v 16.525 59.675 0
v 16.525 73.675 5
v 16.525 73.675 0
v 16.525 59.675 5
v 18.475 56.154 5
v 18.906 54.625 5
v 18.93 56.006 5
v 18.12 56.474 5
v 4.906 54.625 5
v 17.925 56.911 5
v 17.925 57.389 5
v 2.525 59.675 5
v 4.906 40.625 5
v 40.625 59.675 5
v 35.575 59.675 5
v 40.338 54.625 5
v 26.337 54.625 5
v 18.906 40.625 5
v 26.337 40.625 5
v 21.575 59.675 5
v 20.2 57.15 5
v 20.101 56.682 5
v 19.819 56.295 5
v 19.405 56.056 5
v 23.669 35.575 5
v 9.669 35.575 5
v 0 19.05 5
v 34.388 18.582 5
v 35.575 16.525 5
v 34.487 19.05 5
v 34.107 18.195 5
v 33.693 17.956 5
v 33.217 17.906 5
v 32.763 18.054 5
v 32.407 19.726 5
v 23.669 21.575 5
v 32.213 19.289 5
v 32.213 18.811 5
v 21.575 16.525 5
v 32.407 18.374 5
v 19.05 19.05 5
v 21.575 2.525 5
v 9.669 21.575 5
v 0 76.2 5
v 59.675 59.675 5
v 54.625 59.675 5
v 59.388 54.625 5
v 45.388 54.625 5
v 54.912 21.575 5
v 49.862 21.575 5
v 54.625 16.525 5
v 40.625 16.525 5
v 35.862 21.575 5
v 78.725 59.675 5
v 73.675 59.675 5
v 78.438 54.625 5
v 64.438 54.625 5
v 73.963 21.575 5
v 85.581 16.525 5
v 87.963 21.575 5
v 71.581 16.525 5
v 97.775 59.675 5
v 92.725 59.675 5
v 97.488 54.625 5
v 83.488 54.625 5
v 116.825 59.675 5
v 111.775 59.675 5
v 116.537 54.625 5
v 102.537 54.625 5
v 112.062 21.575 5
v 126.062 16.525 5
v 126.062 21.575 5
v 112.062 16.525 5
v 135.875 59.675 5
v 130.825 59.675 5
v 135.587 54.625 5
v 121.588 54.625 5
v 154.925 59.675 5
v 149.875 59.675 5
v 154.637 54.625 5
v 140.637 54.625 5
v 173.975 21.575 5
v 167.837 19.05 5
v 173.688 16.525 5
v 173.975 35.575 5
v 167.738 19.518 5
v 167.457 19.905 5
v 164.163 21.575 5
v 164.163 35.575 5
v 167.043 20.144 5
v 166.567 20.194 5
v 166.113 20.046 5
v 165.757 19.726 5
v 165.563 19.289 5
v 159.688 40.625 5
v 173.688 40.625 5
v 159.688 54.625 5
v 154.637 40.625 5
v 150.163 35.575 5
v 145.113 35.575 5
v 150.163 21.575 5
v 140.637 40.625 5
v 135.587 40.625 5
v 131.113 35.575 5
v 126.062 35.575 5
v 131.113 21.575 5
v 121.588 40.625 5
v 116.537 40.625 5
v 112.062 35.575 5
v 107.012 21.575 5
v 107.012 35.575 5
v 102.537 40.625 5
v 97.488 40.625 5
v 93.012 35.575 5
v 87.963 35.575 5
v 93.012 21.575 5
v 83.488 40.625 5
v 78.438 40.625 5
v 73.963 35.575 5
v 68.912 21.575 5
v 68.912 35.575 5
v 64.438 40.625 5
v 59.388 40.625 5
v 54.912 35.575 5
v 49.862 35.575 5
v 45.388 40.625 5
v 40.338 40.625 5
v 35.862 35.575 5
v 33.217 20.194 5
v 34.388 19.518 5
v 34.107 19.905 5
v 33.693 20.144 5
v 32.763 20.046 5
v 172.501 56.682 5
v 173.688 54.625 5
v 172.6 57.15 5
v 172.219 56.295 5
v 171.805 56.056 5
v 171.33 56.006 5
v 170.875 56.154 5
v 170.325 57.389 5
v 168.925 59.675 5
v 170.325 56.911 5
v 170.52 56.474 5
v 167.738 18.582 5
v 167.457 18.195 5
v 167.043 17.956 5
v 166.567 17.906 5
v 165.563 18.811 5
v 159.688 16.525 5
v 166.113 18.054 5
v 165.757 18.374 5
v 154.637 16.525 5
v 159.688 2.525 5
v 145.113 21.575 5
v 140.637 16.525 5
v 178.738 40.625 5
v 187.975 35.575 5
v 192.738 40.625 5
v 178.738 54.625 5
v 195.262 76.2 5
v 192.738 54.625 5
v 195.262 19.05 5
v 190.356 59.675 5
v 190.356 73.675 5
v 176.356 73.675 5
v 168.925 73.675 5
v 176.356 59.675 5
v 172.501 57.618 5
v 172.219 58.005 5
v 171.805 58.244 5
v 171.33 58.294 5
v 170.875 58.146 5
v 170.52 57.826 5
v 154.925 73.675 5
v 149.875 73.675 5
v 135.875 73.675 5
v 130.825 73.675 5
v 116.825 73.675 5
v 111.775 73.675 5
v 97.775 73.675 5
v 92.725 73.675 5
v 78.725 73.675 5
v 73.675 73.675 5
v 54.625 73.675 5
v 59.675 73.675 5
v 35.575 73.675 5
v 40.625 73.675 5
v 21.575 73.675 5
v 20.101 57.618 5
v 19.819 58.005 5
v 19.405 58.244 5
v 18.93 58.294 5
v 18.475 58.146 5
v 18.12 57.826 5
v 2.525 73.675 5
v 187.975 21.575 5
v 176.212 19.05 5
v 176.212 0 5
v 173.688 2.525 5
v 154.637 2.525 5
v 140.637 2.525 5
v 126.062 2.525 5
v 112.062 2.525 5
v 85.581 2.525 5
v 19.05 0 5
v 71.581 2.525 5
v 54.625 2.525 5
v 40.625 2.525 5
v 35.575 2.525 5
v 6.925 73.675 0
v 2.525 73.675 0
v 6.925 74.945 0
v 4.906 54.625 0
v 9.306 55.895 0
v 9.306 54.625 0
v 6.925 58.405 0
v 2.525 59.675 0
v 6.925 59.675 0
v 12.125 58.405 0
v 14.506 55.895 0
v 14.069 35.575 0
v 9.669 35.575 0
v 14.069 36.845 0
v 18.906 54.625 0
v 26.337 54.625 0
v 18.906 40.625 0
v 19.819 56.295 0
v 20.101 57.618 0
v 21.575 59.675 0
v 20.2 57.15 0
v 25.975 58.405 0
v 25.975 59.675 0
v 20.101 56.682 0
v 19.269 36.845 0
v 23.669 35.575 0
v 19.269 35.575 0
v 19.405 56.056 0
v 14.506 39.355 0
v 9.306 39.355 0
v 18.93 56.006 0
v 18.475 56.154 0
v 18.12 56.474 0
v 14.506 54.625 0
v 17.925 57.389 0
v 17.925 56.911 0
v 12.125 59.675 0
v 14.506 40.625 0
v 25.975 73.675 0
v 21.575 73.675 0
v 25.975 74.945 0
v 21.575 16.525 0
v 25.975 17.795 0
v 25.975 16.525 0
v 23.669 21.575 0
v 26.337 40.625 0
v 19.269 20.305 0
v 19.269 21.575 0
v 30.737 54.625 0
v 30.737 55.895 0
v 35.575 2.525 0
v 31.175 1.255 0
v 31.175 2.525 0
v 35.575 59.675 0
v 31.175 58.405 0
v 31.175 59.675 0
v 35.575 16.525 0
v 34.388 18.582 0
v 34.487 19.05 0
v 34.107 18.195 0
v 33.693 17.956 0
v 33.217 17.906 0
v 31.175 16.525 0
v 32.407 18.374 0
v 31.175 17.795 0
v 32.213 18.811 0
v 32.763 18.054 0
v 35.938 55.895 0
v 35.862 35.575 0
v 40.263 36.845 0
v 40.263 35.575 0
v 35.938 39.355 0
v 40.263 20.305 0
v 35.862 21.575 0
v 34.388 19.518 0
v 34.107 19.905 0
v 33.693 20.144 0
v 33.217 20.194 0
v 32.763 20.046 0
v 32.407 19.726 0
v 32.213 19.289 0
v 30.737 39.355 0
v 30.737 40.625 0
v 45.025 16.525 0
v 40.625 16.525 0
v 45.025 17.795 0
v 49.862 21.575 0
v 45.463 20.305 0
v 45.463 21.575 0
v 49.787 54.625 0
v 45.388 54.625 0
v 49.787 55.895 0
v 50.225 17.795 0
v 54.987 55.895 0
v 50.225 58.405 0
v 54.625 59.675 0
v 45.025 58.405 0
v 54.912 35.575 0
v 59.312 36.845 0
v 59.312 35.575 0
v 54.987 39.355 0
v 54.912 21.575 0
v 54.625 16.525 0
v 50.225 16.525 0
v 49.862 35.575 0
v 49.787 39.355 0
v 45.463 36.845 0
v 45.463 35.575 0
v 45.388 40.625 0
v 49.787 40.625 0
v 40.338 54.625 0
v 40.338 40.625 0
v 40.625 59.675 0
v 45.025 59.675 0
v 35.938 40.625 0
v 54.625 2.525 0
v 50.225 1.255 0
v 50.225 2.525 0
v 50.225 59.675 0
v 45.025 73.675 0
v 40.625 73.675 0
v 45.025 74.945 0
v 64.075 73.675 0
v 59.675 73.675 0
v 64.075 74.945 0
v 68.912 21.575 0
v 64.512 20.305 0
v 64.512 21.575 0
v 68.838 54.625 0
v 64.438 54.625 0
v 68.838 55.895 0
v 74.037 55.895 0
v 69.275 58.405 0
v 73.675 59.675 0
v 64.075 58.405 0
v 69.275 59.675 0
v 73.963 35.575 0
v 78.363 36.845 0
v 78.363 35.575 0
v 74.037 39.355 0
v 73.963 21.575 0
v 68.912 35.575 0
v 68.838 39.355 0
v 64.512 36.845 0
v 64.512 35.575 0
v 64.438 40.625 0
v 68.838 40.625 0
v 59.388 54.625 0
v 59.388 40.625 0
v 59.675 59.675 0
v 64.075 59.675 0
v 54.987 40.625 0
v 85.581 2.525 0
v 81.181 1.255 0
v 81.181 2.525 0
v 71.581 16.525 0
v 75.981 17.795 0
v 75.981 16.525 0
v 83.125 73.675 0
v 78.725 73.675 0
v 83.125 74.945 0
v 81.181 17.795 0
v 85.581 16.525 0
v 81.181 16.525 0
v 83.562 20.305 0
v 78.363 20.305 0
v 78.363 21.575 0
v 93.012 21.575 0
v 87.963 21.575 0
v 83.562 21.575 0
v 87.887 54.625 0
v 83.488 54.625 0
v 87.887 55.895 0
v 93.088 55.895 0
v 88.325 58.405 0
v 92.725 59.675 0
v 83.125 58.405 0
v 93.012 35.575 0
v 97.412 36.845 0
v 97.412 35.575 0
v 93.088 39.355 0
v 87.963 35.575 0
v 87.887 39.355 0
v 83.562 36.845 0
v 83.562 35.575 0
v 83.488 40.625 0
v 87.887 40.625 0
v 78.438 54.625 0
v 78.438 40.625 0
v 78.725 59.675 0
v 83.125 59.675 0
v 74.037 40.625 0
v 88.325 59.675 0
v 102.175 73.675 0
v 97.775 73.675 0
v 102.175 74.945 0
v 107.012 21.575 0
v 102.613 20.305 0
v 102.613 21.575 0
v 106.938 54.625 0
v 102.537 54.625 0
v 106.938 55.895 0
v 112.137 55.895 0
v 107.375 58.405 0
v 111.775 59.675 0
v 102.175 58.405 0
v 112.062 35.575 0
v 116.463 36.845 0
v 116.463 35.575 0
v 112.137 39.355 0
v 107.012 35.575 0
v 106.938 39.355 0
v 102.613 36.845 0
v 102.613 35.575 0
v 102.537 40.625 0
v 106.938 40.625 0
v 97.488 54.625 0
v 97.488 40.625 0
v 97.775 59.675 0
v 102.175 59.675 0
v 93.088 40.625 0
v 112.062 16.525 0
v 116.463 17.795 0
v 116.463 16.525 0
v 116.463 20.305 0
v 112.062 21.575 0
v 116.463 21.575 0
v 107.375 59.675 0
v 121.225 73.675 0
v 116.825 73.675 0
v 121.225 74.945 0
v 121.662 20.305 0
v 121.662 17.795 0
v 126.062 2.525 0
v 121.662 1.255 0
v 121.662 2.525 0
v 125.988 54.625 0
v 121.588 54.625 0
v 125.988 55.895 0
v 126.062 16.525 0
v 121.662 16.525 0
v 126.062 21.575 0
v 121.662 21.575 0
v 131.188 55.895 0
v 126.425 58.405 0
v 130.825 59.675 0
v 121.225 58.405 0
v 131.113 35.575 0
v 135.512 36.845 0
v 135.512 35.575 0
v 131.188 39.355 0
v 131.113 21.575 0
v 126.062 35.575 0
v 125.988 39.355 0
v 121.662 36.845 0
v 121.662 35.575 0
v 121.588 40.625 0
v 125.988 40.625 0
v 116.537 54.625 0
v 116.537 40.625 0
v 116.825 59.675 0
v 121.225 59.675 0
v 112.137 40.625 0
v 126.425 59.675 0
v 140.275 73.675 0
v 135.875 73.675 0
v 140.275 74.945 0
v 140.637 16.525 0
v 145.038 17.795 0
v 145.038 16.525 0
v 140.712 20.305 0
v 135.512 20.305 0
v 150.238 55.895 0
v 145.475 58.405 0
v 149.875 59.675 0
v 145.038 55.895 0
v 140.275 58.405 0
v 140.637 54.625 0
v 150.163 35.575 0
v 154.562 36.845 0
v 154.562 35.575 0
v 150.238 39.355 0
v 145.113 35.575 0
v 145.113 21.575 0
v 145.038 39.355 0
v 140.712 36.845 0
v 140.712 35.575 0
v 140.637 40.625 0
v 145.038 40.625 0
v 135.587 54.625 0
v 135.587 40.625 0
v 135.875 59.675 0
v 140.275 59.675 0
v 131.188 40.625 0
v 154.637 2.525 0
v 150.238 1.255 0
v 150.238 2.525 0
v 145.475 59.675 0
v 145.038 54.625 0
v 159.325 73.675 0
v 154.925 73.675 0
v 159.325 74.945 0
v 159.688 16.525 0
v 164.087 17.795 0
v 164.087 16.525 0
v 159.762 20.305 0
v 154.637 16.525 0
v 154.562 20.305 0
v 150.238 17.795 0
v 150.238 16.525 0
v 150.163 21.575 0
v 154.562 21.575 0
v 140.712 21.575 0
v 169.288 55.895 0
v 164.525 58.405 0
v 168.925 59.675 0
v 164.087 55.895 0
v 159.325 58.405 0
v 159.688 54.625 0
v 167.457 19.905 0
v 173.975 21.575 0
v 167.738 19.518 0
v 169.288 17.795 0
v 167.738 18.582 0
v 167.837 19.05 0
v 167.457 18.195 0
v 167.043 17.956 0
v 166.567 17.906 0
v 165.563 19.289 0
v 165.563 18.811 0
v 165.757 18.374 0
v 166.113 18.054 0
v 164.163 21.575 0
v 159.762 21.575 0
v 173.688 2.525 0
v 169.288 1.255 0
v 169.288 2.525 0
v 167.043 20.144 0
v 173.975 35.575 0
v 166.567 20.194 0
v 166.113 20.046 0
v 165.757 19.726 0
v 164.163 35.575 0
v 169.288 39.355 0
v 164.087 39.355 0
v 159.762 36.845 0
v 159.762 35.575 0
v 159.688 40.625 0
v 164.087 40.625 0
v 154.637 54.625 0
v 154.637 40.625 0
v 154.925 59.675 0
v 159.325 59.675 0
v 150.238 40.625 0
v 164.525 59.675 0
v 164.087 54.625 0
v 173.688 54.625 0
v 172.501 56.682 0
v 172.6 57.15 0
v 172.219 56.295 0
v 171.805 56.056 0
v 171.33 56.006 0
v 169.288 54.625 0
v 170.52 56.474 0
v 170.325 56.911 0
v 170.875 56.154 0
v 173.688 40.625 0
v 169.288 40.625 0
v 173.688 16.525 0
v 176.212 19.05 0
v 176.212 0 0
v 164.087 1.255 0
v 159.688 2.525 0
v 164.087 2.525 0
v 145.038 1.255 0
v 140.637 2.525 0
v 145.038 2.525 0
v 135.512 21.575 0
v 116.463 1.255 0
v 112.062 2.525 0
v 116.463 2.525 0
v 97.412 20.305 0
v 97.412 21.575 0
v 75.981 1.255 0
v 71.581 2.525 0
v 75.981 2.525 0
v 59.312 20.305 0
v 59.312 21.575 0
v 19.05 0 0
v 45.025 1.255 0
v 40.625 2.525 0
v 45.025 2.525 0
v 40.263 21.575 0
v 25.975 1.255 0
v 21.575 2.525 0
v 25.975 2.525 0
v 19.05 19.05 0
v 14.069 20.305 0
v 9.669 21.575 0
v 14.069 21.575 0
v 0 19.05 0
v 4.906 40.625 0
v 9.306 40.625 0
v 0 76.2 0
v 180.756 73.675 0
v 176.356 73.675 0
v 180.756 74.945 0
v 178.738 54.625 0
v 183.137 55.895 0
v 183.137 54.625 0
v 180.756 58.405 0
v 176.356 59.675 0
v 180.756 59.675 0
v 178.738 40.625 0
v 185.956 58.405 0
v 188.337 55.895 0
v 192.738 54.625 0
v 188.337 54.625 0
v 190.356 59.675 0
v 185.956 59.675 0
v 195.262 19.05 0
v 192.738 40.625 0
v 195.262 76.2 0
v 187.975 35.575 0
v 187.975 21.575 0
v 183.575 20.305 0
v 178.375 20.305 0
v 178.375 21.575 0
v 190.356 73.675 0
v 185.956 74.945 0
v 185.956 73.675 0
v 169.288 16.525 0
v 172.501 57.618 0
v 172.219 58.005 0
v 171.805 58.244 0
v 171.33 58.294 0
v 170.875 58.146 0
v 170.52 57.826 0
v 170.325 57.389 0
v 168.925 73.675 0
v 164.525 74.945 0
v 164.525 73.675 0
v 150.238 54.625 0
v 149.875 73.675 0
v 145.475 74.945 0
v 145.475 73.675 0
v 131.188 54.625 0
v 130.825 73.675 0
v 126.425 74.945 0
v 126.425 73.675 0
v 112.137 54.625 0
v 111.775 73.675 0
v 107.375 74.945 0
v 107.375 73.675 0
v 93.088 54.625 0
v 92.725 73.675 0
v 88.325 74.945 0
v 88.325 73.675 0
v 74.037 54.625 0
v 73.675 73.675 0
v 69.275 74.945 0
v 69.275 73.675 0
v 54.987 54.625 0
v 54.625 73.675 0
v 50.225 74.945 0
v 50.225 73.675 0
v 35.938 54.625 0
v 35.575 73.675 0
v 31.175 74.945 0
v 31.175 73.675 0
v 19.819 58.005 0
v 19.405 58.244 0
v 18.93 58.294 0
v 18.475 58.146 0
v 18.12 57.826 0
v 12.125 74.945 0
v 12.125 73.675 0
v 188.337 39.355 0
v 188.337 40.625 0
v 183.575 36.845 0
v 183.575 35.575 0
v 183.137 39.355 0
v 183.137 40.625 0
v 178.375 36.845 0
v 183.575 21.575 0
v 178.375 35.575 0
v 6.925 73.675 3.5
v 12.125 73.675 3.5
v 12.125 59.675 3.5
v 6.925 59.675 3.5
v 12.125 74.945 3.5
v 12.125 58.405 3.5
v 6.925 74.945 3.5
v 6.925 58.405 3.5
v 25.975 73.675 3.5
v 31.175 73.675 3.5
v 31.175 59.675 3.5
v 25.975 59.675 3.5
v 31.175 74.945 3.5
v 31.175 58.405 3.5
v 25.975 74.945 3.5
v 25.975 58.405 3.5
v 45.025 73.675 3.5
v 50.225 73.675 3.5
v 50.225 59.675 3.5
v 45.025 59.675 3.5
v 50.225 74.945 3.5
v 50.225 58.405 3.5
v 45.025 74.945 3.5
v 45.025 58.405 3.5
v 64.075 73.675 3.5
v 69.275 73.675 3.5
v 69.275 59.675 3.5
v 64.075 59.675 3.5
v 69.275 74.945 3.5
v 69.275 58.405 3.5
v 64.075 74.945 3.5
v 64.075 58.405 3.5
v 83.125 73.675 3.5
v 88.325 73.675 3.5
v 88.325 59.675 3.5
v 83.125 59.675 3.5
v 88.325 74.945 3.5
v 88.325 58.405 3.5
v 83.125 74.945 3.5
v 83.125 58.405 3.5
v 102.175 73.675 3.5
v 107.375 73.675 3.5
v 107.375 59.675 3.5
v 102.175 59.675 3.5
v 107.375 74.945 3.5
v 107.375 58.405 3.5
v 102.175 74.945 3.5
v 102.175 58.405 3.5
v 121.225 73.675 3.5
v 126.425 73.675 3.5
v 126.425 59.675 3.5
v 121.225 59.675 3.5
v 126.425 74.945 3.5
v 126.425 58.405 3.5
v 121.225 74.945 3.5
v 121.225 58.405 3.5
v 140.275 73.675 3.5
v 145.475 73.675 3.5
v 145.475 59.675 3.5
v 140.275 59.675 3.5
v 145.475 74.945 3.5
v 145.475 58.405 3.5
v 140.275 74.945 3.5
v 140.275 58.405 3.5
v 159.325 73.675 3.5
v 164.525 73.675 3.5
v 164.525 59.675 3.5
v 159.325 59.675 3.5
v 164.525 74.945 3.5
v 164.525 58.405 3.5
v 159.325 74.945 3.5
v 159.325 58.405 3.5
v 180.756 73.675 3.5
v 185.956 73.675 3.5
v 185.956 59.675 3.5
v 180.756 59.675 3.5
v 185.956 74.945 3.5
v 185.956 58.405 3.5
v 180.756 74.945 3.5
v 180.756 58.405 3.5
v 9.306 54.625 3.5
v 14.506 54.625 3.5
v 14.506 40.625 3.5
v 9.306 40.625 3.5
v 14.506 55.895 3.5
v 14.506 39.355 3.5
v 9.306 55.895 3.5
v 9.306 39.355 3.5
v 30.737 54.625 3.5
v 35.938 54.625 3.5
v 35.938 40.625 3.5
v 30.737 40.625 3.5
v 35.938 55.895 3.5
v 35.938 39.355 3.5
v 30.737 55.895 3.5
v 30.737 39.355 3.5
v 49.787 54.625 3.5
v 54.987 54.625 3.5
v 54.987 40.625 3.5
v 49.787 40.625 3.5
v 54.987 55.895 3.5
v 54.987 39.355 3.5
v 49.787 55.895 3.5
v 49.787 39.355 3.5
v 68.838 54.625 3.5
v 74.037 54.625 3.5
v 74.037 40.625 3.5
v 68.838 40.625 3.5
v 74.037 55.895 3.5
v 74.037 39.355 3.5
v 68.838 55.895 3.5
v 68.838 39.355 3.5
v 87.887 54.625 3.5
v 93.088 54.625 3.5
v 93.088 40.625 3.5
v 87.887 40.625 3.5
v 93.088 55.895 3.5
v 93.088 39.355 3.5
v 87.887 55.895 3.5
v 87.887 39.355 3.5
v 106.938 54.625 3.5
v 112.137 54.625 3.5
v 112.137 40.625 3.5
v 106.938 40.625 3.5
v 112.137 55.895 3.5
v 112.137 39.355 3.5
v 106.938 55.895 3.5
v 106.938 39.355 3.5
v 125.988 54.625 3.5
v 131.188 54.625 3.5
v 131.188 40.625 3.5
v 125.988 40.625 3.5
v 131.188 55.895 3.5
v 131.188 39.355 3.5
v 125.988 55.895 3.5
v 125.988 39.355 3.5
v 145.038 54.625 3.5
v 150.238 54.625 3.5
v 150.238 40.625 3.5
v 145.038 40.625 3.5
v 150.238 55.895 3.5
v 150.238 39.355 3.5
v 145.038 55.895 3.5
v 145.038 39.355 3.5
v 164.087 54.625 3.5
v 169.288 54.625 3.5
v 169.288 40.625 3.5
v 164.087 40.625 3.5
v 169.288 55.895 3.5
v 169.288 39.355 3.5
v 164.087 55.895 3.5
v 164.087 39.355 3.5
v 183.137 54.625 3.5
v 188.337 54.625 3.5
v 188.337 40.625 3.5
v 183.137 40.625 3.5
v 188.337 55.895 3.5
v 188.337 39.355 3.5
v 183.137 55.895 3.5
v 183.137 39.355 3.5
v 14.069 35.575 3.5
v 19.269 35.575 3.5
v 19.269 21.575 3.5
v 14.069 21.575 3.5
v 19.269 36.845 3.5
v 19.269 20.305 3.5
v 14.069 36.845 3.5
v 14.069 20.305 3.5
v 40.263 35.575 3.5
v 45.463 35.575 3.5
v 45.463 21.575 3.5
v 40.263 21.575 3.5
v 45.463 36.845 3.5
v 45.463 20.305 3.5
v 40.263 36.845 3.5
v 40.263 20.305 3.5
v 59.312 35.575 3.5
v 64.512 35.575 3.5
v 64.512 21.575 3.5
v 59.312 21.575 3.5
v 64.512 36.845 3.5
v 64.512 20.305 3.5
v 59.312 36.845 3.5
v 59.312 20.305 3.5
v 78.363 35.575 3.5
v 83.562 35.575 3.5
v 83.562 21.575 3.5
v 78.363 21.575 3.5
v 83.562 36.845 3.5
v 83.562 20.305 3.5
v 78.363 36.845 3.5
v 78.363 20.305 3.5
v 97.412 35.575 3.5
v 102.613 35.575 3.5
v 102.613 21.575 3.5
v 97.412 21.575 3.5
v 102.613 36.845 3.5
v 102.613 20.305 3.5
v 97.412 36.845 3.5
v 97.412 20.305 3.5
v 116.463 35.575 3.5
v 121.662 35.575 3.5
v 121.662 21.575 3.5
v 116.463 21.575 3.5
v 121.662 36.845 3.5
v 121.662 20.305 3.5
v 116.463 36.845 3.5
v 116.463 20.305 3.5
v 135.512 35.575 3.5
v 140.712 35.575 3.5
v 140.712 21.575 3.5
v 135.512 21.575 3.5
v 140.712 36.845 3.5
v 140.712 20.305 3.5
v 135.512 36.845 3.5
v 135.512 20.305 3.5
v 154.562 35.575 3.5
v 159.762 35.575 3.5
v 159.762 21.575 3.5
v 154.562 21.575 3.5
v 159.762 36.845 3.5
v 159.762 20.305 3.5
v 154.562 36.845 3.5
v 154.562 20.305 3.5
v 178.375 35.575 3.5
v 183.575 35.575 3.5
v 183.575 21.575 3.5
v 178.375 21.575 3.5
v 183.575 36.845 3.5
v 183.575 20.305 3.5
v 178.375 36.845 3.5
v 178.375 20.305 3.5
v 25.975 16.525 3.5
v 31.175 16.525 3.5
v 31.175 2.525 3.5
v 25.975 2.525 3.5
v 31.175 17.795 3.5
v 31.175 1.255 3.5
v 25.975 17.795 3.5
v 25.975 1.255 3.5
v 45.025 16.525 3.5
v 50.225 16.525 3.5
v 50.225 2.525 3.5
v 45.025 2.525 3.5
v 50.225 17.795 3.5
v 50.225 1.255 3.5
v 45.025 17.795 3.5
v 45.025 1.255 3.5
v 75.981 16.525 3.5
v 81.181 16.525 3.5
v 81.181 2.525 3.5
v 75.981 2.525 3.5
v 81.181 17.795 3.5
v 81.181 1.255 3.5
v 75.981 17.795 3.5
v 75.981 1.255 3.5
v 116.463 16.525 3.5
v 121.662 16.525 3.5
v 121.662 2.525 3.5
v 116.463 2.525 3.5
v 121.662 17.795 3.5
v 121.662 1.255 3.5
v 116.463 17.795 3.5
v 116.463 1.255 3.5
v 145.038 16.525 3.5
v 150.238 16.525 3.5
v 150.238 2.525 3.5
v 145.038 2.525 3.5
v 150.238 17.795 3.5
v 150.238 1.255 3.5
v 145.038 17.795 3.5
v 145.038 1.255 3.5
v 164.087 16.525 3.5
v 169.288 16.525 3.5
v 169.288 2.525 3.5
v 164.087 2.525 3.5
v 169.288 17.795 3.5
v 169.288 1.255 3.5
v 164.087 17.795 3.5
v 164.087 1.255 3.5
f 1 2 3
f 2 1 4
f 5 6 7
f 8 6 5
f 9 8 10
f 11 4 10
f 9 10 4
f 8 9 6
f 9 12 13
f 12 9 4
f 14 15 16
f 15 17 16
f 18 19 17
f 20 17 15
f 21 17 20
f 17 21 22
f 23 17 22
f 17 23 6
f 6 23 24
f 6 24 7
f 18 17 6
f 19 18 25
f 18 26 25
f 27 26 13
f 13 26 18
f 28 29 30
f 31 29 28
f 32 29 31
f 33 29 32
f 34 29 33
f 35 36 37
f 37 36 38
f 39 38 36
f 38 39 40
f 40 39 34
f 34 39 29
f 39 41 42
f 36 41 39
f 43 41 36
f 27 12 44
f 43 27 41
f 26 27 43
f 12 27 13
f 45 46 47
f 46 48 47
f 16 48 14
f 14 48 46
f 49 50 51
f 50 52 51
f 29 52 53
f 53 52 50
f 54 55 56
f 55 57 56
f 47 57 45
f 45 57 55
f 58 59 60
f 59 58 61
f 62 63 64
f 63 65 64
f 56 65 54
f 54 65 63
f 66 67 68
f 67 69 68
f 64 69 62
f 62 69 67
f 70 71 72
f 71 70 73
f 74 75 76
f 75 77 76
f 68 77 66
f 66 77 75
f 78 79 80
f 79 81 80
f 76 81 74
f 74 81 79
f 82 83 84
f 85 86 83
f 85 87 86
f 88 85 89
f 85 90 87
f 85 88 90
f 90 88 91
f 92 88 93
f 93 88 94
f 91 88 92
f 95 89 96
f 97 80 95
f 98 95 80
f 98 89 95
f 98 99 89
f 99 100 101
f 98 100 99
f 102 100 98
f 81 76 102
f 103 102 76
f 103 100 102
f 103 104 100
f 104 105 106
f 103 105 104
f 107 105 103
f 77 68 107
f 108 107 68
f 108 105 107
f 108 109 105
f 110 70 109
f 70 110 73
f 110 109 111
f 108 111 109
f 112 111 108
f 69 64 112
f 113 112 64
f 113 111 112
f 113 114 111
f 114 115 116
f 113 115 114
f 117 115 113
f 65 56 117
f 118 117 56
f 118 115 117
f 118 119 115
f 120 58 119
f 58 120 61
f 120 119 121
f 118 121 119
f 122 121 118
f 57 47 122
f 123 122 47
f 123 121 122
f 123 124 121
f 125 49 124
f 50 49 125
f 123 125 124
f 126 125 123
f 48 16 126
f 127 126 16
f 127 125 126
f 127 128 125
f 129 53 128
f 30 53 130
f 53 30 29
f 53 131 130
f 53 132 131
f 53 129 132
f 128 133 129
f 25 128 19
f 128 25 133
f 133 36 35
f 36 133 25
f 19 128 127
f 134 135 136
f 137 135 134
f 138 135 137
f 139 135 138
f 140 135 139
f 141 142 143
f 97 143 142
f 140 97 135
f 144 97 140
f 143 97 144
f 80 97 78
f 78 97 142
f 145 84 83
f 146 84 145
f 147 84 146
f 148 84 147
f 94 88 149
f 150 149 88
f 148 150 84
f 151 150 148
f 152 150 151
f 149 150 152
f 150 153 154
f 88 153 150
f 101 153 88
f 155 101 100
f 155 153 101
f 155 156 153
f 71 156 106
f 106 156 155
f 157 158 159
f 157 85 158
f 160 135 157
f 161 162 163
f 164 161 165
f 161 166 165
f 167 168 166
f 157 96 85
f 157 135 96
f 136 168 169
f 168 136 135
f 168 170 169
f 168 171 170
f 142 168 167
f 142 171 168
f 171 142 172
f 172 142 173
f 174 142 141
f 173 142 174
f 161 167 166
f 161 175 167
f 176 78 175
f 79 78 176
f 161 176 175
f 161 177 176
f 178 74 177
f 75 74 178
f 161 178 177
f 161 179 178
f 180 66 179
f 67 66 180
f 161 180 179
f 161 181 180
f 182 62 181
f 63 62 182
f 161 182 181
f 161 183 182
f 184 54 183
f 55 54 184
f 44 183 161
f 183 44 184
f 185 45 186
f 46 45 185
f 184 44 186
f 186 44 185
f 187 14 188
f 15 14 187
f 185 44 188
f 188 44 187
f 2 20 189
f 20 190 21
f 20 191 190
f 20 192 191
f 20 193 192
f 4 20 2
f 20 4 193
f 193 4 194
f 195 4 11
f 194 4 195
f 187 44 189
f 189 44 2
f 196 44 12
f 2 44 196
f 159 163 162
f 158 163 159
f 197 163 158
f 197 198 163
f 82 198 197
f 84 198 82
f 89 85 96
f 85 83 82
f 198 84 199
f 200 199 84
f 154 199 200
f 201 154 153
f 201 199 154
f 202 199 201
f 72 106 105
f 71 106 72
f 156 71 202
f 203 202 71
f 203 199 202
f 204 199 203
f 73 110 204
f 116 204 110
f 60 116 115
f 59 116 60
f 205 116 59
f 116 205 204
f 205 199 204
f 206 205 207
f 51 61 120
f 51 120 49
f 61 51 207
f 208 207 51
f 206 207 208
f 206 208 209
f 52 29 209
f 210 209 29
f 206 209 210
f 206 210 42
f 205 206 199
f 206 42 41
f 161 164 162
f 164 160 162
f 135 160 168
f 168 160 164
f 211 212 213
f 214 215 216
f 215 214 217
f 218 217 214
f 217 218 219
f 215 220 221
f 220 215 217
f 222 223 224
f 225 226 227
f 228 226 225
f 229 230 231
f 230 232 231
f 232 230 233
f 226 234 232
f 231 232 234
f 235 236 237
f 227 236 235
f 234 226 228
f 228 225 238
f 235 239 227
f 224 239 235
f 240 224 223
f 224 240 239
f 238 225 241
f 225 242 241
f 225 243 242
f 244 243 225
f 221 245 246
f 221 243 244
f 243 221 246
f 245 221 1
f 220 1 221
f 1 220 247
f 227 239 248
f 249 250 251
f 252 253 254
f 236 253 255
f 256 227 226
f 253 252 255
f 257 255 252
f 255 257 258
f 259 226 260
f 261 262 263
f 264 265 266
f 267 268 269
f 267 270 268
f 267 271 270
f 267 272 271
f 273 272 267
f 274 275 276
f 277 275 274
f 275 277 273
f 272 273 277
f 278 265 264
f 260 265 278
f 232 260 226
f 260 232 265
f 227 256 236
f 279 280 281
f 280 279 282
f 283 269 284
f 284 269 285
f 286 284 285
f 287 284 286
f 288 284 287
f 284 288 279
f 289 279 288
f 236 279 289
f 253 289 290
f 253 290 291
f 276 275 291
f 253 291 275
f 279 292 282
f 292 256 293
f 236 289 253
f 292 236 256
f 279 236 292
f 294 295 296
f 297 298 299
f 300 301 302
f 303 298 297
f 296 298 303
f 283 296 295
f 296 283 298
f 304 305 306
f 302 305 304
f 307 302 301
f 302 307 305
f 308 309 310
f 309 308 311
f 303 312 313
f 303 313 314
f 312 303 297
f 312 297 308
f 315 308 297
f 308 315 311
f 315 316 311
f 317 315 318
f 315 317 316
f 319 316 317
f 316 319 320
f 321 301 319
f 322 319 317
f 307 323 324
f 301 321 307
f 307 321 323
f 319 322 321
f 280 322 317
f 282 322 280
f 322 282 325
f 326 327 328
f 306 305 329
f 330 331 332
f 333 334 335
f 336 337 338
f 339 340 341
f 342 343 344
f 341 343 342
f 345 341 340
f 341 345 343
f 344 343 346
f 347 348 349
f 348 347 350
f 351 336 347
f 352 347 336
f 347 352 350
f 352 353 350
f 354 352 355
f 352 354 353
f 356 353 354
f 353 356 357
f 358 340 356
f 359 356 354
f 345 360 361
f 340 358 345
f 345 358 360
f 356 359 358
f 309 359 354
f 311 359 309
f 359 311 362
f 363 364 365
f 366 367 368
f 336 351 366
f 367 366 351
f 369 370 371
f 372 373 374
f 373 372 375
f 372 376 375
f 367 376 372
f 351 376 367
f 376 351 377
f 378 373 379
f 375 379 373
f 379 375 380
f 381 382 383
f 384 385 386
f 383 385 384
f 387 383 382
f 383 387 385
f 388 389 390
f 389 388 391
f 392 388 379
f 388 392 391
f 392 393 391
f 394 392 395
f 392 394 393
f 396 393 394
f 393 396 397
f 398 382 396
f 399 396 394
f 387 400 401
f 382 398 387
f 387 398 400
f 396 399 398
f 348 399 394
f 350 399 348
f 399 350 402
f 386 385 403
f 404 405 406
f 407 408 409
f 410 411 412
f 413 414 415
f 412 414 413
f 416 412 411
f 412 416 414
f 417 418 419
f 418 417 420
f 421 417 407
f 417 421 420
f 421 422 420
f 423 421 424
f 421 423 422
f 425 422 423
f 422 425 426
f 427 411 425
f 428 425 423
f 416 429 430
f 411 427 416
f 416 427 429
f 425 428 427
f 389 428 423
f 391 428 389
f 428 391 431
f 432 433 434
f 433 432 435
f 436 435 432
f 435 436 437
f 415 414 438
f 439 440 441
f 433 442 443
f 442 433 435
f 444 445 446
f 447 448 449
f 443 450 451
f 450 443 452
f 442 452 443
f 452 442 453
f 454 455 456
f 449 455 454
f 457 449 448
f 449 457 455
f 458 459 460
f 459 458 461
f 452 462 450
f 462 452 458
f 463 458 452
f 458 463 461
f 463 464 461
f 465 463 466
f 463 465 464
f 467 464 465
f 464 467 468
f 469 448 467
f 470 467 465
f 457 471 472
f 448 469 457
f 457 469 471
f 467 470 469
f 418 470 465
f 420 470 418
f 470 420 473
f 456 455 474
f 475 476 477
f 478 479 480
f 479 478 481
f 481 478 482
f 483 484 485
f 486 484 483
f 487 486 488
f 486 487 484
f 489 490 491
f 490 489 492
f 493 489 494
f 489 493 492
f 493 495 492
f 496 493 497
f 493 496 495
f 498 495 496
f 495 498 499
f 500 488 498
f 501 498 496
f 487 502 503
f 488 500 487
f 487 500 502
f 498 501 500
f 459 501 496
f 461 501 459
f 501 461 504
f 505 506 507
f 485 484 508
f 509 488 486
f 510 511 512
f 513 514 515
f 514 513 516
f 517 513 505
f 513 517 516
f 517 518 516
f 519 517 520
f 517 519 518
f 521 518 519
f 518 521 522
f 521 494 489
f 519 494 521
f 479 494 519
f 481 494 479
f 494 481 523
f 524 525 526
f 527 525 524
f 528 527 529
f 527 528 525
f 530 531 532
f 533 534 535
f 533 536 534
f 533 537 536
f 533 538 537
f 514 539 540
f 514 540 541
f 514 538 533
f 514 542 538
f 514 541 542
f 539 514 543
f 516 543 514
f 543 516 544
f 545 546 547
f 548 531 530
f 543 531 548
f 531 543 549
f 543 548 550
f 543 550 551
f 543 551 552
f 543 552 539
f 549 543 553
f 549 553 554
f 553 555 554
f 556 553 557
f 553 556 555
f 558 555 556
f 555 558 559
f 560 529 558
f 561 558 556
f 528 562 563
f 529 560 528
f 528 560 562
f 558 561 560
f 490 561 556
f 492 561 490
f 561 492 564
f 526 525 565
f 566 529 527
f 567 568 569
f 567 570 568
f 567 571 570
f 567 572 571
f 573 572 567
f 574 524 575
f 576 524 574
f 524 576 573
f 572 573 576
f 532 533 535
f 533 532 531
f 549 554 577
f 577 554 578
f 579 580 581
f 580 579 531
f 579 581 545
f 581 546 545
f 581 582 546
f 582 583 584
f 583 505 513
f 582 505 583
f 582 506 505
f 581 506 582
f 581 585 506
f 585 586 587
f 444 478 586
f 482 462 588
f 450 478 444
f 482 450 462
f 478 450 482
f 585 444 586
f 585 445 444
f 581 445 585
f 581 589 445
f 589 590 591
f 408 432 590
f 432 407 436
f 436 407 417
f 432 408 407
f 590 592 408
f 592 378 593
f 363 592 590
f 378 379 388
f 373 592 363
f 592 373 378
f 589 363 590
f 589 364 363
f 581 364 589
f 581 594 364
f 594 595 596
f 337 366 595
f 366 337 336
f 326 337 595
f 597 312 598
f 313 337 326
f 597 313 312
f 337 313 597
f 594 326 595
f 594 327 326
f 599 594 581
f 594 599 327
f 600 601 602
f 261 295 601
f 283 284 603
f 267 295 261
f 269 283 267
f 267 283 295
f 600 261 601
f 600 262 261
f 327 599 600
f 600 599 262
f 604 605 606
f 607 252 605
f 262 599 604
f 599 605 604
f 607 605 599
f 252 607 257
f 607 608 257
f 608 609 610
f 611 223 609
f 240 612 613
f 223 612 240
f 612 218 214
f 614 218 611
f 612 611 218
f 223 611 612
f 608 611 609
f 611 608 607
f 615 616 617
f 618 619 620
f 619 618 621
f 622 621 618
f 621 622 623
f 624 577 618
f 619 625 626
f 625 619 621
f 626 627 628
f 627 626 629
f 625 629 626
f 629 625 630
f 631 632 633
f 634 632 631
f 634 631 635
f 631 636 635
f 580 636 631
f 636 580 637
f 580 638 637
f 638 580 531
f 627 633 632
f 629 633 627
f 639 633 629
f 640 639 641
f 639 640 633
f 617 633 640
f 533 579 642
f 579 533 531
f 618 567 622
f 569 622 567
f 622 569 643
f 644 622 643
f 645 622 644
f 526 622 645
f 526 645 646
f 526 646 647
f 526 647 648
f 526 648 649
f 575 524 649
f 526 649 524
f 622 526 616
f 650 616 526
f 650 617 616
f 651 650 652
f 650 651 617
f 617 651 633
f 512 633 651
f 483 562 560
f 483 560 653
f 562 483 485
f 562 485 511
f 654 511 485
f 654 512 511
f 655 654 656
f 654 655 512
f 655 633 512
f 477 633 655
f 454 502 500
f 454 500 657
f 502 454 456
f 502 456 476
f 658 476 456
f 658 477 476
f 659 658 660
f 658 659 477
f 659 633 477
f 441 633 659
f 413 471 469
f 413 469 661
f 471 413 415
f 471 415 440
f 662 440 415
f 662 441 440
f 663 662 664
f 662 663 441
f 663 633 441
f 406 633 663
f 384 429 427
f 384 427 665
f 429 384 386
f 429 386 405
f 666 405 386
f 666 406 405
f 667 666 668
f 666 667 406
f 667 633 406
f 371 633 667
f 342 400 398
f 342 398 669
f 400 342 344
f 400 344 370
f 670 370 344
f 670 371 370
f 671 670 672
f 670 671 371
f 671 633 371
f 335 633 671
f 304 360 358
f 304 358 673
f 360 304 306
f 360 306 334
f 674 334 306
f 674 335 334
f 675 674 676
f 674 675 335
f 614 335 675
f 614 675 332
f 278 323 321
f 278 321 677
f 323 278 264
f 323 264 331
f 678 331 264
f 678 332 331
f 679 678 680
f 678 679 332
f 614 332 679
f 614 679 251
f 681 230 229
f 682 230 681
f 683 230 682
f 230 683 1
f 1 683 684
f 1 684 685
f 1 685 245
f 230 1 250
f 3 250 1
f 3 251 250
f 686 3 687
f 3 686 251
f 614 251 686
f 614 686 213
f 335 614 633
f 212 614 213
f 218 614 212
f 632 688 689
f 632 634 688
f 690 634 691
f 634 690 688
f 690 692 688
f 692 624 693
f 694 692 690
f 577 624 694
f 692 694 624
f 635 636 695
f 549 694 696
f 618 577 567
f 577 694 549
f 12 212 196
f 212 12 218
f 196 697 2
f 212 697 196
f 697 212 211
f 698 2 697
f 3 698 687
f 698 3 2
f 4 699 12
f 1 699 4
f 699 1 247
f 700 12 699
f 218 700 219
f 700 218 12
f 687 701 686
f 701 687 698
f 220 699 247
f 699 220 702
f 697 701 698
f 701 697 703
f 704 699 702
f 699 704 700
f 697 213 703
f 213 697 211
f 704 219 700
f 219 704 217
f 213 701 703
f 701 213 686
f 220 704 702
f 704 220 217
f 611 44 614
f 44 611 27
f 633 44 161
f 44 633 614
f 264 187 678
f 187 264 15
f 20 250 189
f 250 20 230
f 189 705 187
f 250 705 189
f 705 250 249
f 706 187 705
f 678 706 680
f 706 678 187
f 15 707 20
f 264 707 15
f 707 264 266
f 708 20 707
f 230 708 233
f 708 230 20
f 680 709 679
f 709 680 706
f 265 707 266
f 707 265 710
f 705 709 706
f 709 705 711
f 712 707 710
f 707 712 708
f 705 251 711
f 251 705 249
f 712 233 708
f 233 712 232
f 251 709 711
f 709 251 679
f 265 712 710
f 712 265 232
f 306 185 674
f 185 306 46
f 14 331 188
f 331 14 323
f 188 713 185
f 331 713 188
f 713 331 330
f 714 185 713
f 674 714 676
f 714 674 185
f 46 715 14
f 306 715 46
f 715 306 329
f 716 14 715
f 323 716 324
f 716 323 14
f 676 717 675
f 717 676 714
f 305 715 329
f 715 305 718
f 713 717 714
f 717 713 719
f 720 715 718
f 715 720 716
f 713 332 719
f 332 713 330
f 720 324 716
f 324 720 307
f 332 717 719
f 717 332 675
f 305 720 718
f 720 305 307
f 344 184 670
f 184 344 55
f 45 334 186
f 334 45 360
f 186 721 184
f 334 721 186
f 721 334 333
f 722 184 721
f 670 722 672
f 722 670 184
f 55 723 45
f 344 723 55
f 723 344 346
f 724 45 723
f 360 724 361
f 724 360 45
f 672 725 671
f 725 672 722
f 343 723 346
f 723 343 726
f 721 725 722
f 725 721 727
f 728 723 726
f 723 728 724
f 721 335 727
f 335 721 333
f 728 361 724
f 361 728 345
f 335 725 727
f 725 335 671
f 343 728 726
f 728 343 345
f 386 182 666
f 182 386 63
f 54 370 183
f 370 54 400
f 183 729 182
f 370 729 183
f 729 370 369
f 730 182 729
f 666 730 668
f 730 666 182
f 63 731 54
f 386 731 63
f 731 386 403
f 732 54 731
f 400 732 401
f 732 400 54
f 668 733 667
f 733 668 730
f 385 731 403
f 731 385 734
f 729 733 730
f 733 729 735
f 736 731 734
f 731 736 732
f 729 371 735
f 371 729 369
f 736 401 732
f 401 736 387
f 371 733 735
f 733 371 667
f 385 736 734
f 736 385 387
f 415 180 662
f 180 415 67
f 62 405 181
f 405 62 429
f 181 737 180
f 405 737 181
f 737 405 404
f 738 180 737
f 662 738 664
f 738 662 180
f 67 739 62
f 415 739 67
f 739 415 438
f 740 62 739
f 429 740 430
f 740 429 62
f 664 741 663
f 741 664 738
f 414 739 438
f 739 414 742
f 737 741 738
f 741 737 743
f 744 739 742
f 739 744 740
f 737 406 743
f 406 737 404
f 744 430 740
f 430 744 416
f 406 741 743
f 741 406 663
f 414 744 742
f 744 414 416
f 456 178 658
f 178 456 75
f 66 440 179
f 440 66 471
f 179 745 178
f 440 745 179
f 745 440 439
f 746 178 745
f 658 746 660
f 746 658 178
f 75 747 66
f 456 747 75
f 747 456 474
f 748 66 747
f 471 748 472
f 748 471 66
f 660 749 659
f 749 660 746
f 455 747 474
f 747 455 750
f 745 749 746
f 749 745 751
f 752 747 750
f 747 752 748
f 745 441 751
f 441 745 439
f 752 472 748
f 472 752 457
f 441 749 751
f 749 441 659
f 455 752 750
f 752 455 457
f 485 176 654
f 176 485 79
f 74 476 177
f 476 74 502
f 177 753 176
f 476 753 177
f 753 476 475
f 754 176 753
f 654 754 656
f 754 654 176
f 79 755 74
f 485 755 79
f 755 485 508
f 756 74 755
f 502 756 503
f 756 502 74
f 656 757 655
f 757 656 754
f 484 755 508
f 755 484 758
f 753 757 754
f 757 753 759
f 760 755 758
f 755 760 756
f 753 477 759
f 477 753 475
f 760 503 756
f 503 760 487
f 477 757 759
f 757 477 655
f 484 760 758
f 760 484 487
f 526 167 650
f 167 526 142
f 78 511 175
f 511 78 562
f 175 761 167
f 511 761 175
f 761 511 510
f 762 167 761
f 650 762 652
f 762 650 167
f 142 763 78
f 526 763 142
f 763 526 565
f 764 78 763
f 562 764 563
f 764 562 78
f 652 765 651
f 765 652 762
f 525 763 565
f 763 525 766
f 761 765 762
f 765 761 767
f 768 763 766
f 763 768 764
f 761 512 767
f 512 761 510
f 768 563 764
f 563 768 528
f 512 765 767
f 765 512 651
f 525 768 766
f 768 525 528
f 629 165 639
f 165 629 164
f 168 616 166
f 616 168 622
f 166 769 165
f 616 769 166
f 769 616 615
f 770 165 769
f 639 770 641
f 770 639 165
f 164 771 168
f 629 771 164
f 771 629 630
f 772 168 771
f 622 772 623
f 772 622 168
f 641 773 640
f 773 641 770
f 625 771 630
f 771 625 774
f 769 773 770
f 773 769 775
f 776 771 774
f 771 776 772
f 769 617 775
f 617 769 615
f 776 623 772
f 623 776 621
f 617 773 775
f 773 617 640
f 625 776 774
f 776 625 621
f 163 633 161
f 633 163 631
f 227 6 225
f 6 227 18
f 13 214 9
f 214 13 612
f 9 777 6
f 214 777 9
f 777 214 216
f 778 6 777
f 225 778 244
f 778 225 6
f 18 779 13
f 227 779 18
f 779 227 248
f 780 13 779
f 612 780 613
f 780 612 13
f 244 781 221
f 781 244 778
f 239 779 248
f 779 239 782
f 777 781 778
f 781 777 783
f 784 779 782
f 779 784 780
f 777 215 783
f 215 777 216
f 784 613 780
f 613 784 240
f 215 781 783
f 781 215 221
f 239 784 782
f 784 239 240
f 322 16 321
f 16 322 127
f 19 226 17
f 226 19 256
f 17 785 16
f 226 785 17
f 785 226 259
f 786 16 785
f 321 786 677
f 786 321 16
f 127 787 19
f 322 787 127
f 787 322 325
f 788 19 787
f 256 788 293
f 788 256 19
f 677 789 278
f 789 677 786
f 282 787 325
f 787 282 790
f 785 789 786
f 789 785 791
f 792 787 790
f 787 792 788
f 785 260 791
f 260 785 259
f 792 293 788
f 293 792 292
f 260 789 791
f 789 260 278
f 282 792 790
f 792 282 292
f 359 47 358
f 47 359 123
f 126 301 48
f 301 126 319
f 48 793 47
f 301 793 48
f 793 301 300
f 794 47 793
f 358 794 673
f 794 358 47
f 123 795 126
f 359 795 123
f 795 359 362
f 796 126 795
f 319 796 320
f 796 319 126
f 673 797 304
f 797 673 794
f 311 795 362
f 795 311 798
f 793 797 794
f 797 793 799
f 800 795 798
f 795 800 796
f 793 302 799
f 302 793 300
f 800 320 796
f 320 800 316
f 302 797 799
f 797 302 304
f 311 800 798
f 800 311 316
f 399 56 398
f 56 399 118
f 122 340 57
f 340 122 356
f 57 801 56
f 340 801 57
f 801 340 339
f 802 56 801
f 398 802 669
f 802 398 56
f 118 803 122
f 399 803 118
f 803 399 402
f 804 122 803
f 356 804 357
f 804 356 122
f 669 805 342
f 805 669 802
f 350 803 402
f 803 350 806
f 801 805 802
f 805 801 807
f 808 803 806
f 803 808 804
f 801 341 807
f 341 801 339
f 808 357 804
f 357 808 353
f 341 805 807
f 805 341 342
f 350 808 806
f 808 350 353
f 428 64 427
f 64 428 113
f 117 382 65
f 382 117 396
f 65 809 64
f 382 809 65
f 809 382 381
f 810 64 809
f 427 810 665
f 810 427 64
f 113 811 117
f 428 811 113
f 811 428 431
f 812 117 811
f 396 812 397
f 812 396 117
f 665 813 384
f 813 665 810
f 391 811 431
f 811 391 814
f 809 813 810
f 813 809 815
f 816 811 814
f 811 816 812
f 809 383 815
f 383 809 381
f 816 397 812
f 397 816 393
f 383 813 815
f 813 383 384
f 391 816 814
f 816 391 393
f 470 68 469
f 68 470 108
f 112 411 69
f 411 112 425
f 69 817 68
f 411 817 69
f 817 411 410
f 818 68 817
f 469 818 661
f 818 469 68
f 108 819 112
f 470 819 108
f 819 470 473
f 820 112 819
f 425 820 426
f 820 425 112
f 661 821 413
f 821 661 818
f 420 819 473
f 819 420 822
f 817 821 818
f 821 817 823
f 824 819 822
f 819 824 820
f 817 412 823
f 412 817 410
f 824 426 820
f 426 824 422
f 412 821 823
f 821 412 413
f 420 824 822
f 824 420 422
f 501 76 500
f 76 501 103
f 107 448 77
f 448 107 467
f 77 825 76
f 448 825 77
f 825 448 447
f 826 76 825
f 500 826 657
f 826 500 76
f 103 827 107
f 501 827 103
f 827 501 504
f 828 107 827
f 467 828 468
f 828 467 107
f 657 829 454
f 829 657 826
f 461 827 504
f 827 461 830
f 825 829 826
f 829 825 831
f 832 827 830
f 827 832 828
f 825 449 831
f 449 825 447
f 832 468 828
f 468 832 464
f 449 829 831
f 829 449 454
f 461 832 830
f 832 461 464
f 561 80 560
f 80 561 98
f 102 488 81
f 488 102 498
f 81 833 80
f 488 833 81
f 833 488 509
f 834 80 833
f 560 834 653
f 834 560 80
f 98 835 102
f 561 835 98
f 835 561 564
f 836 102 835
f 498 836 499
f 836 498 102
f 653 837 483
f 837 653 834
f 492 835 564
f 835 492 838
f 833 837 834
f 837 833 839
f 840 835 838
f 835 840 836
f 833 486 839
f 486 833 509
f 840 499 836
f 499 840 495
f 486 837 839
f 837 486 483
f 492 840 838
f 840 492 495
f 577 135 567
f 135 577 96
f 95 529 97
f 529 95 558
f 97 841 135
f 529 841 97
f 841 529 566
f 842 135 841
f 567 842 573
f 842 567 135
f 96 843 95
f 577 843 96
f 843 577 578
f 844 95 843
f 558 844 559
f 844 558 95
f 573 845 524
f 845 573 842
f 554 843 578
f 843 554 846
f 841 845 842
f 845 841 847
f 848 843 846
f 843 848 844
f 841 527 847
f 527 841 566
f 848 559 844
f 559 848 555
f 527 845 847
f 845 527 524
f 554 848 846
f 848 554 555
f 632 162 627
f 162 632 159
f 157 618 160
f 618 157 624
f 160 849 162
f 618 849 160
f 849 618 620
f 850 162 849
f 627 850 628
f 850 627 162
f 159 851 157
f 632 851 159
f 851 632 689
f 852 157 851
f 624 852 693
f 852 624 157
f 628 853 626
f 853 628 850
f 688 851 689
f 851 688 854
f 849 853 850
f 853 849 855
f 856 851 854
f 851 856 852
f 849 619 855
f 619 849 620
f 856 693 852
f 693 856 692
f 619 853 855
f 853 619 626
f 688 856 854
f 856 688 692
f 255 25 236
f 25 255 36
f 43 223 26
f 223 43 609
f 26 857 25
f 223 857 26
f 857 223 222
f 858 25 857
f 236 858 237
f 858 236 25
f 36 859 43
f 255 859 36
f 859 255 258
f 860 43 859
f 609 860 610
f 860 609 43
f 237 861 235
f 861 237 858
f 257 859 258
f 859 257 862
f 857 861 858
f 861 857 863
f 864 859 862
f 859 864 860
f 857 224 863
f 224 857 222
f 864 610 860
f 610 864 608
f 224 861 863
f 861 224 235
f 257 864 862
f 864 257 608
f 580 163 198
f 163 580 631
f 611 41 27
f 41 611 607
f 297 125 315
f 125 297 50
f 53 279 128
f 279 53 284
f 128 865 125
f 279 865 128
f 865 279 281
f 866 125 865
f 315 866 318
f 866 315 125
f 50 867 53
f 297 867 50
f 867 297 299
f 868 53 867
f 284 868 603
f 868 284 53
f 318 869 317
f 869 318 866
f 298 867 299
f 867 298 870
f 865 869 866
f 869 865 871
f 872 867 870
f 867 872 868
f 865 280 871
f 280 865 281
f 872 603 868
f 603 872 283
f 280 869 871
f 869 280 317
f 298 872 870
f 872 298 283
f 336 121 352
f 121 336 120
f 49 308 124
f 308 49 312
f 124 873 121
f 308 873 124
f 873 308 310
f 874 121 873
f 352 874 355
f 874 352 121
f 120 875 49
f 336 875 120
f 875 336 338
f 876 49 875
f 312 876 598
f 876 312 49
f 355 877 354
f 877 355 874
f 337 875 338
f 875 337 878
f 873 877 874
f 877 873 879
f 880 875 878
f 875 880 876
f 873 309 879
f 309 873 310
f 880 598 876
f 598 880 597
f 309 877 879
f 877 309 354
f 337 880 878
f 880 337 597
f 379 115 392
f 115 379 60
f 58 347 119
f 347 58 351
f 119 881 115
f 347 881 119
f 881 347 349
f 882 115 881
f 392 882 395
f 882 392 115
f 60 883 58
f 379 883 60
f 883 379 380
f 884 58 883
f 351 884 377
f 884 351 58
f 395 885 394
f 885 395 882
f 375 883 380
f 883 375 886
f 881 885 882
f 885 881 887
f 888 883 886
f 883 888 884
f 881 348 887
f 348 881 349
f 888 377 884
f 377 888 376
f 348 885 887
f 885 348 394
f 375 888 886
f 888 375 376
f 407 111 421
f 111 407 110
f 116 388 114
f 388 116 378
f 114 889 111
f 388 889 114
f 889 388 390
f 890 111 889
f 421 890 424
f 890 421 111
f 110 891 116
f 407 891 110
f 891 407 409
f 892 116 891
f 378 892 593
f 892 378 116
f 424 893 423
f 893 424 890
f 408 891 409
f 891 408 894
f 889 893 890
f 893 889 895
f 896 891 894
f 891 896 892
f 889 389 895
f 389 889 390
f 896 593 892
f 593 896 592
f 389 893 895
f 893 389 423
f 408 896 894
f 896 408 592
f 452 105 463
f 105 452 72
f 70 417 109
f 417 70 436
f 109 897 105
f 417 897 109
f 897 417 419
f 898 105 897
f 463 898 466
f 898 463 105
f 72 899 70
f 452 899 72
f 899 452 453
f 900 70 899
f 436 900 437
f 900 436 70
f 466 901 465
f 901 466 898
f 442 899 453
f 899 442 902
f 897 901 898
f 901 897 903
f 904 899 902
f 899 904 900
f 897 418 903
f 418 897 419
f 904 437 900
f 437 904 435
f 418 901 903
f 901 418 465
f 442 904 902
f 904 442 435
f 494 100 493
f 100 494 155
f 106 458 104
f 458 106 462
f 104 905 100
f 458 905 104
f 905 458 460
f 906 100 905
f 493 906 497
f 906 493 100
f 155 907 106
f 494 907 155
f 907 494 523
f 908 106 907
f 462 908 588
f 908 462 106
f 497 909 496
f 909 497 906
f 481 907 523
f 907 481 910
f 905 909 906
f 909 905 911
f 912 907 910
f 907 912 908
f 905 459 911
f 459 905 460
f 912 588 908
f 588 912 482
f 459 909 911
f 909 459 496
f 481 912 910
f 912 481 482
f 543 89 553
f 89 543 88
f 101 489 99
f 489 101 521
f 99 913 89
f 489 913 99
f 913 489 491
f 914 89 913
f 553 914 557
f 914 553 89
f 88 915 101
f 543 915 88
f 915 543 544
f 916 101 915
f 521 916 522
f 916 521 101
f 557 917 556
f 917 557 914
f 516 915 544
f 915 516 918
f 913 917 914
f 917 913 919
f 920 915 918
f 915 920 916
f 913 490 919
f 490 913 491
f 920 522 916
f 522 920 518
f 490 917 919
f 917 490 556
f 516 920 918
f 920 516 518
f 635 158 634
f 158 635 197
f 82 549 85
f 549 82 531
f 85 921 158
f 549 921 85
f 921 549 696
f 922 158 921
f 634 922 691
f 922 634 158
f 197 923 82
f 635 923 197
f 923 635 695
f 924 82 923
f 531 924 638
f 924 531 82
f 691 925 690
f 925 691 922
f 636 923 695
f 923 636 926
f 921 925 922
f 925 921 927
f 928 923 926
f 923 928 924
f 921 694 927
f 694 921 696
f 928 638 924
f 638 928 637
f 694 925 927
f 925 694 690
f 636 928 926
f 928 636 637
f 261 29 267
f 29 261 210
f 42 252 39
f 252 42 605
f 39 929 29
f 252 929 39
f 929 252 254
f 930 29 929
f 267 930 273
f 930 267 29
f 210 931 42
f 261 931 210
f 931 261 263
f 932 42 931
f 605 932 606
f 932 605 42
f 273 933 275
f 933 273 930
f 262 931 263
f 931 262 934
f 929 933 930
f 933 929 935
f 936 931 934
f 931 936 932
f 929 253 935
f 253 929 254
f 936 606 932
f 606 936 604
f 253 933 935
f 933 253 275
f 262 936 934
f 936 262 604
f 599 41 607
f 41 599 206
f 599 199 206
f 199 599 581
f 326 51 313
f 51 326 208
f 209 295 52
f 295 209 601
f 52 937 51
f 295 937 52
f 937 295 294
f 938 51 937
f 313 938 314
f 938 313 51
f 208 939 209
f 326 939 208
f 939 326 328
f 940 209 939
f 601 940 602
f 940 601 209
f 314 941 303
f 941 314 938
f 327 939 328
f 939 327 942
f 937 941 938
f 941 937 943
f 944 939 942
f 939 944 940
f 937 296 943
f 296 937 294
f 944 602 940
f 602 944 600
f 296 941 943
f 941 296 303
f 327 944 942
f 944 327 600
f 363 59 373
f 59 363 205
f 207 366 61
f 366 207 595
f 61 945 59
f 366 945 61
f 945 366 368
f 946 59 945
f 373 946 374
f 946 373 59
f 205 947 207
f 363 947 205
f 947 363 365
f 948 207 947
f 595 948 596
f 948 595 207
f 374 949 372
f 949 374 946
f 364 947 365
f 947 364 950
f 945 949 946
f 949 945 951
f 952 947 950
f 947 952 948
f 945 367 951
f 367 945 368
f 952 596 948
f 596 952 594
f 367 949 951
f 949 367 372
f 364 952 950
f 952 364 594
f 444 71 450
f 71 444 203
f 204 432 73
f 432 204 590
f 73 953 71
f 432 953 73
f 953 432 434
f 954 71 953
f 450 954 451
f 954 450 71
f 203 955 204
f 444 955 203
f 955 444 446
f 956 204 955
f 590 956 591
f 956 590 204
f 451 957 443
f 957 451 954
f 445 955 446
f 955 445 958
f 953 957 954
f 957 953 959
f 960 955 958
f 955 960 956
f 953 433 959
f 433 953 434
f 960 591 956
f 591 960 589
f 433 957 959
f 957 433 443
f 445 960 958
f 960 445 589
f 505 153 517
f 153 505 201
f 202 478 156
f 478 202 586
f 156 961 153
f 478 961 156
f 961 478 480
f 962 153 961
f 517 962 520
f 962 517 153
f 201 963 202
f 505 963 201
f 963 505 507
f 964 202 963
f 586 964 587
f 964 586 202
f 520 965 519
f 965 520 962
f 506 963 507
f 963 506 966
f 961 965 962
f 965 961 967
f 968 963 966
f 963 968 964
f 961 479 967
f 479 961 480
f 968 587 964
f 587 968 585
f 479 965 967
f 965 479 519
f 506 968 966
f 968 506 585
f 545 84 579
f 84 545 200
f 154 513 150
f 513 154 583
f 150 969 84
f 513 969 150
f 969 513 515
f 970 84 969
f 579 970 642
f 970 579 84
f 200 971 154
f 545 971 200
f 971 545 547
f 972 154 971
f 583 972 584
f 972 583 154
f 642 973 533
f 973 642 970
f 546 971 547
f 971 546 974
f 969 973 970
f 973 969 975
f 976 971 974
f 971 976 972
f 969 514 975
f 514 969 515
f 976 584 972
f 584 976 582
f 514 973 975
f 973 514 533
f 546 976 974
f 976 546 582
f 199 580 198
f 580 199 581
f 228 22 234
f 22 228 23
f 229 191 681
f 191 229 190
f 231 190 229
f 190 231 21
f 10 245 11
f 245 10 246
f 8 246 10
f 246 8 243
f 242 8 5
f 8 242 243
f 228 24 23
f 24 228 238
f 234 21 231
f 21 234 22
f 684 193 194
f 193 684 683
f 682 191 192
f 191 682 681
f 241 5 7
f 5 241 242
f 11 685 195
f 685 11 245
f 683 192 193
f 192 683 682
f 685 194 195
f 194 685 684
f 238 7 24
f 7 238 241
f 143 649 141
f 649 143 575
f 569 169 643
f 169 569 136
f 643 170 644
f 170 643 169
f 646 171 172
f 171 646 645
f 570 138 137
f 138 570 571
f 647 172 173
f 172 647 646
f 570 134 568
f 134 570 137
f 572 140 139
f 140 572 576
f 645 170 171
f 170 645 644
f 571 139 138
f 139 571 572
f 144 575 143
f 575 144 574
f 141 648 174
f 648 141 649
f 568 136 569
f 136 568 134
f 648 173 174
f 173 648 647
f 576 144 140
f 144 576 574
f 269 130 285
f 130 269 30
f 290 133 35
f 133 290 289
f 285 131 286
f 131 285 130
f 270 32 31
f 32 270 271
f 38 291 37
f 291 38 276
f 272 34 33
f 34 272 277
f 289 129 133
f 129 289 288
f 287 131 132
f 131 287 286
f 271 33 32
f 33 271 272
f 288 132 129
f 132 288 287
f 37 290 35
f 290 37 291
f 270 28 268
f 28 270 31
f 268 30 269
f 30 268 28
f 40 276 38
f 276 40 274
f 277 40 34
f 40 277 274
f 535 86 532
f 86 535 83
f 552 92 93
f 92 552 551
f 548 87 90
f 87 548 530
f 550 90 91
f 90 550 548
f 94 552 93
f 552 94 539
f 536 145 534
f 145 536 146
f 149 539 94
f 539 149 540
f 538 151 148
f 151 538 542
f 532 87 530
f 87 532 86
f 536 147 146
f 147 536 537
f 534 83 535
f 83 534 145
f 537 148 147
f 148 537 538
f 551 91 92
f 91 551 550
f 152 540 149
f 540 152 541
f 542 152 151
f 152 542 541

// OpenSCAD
// file: keyboard_case_module.scad
module usb_cutout(keyPositionsX,keyPositionsY,index,keySizes,plateThickness,xSpacing,ySpacing,xCut,yCut,index,interiorHeight,baseThickness,bezelWidth,usbIndex,holeIndices,holeSize){
    
    translate([keyPositionsX[usbIndex]*xSpacing+((xSpacing*keySizes[usbIndex])/2)-(usbWidth/2),keyPositionsY[usbIndex]*ySpacing+ySpacing+bezelGap,baseThickness+1])
    minkowski(){   
    cube([usbWidth,usbHeight,bezelWidth]);
    sphere(1);
    }
}



module hole_cutters(keyPositionsX,keyPositionsY,index,keySizes,plateThickness,xSpacing,ySpacing,xCut,yCut,index,interiorHeight,baseThickness,bezelWidth,usbIndex,holeIndices,holeSize){
union(){
for(i = holeIndices){
translate([keyPositionsX[i]*xSpacing,keyPositionsY[i]*ySpacing,-20])cylinder(100,holeSize/2,holeSize/2);

} 
};   
    
}








module keyboard_body(keyPositionsX,keyPositionsY,index,keySizes,plateThickness,xSpacing,ySpacing,xCut,yCut,index,interiorHeight,baseThickness,bezelWidth,usbIndex,holeIndices,holeSize){
    difference(){
    hull(){
    minkowski(){    
    union(){
    for(i=index){
    translate([keyPositionsX[i]*xSpacing,keyPositionsY[i]*ySpacing,0])cube([xSpacing*keySizes[i],ySpacing,interiorHeight+baseThickness]);
    }
    };
    cylinder(0.01,bezelWidth,bezelWidth);
}
};
hole_cutters(keyPositionsX,keyPositionsY,index,keySizes,plateThickness,xSpacing,ySpacing,xCut,yCut,index,interiorHeight,baseThickness,bezelWidth,usbIndex,holeIndices,holeSize);
};
};


module keyboard_plate(keyPositionsX,keyPositionsY,index,keySizes,plateThickness,xSpacing,ySpacing,xCut,yCut,index,interiorHeight,baseThickness,bezelWidth,usbIndex,holeIndices,holeSize){
    xToCut = (xSpacing - xCut)/2;
    yToCut = (ySpacing - yCut)/2;
    difference(){
    union(){
    for(i = index){            
    difference(){
    translate([keyPositionsX[i]*xSpacing,keyPositionsY[i]*ySpacing,0])cube([xSpacing*keySizes[i],ySpacing,plateThickness]);
    union(){    
    translate([(keyPositionsX[i]*xSpacing)+((keySizes[i]*xSpacing)/2)-((xCut)/2),(keyPositionsY[i]*ySpacing)+yToCut,0])cube([xCut,yCut,plateThickness]);
    if(plateThickness>1.5){
    translate([(keyPositionsX[i]*xSpacing)+((keySizes[i]*xSpacing)/2)-((5.2)/2),(keyPositionsY[i]*ySpacing+(yToCut)-1.27)])cube([5.2,yCut+(2*1.27),plateThickness-1.5]);
    }
    };
    }
}
};
hole_cutters(keyPositionsX,keyPositionsY,index,keySizes,plateThickness,xSpacing,ySpacing,xCut,yCut,index,interiorHeight,baseThickness,bezelWidth,usbIndex,holeIndices,holeSize);
};
}

module keyboard_void(keyPositionsX,keyPositionsY,index,keySizes,plateThickness,xSpacing,ySpacing,xCut,yCut,index,interiorHeight,baseThickness,bezelWidth,usbIndex,holeIndices,holeSize){
    xToCut = (xSpacing - xCut)/2;
    yToCut = (ySpacing - yCut)/2;
    translate([0,0,baseThickness])minkowski(){
    for(i = index){
    translate([keyPositionsX[i]*xSpacing,keyPositionsY[i]*ySpacing,0])cube([xSpacing*keySizes[i],ySpacing,interiorHeight]);
}
cylinder(0.1,bezelGap,bezelGap);
}
}

module keyboard_case(keyPositionsX,keyPositionsY,index,keySizes,plateThickness,xSpacing,ySpacing,xCut,yCut,index,interiorHeight,baseThickness,bezelWidth,usbIndex,holeIndices,holeSize){
difference(){
difference(){
keyboard_body(keyPositionsX,keyPositionsY,index,keySizes,plateThickness,xSpacing,ySpacing,xCut,yCut,index,interiorHeight,baseThickness,bezelWidth,usbIndex,holeIndices,holeSize);
usb_cutout(keyPositionsX,keyPositionsY,index,keySizes,plateThickness,xSpacing,ySpacing,xCut,yCut,index,interiorHeight,baseThickness,bezelWidth,usbIndex,holeIndices,holeSize);    
}

keyboard_void(keyPositionsX,keyPositionsY,index,keySizes,plateThickness,xSpacing,ySpacing,xCut,yCut,index,interiorHeight,baseThickness,bezelWidth,usbIndex,holeIndices,holeSize);
};

};
// main file
include <keyboard_case_module.scad>;

// How much space from plate to the bezel?
bezelGap = 0.5;

// How wide is the Bezel?
bezelWidth = 5;

// How thick is the base?
baseThickness = 3;

// How thick is the plate?
plateThickness = 5;

//Define the Layout
keyPositionsX = [0,1,2,3,4,5,6,7,8,9,0,1.25,2.25,3.25,4.25,5.25,6.25,7.25,8.25,9.25,0,1.75,2.75,3.75,4.75,5.75,6.75,7.75,8.75,1,2,3,5.25,7.25,8.25];
keyPositionsY = [3,3,3,3,3,3,3,3,3,3,2,2,2,2,2,2,2,2,2,2,1,1,1,1,1,1,1,1,1,0,0,0,0,0,0];
keySizes = [1,1,1,1,1,1,1,1,1,1.25,1.25,1,1,1,1,1,1,1,1,1,1.75,1,1,1,1,1,1,1,1.5,1,1,2.25,2,1,1];
index = [0 : 34];

//On what switch index does the usb live?
usbIndex= 9;

//What is the size of the usb cutout? 1mm will be added to this by the fillet. 
usbWidth = 10;
usbHeight = 6;

//Mx Switch Spacing and Switch Cutouts
xSpacing = 19.05;
ySpacing = 19.05;
xCut = 14;
yCut = 14;

//Number of Facets
$fn=15;

//Override this if you want. 
interiorHeight = 10+plateThickness+7.5;

//Where are the holes (placed to the north east of the switch)?
holeIndices = [1,9,21,28];

//What size are the holes?
holeSize = 2.3;

keyboard_plate(keyPositionsX,keyPositionsY,index,keySizes,plateThickness,xSpacing,ySpacing,xCut,yCut,index,interiorHeight,baseThickness,bezelWidth,usbIndex,holeIndices,holeSize);
